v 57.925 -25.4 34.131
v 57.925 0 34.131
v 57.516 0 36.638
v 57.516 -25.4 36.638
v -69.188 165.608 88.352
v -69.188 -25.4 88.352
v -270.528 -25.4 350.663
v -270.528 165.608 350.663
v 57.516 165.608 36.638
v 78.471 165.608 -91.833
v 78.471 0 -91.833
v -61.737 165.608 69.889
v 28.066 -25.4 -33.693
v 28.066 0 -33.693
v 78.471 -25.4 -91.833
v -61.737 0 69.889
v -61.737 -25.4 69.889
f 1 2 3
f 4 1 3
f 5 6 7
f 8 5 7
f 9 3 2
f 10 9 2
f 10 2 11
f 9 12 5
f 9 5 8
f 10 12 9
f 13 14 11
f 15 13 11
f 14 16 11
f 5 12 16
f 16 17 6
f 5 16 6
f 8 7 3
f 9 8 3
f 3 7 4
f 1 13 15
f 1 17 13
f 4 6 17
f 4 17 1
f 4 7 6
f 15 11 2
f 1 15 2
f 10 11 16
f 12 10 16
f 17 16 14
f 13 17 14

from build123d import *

# Parameters (mm, degrees)
F1_DEPTH = 25.4
F2_DEPTH = 165.608


with BuildPart() as f1:
    # F0 (on Front) → F1 (new body)
    with BuildSketch(Plane.XZ):
        Polygon((28.065755, -33.692958), (78.471489, -91.832571), (57.925102, 34.130888), align=None)
        Polygon((-61.737064, 69.888532), (28.065755, -33.692958), (57.925102, 34.130888), (57.516154, 36.638021), align=None)
        Polygon((-69.187544, 88.35157), (-61.737064, 69.888532), (57.516154, 36.638021), (-270.528197, 350.663453), align=None)
    extrude(amount=F1_DEPTH)

    # F1_face (on face) → F2 (join)
    with BuildSketch(Plane(origin=(-46.516677, 0, 96.881853), x_dir=(1, 0, 0), z_dir=(0, 1, 0))):
        Polygon((104.032831, 60.243832), (124.988166, 188.714424), (-15.220387, 26.993321), (-22.670867, 8.530283), (-224.01152, -253.7816), align=None)
    extrude(amount=F2_DEPTH)


solid = f1.part
